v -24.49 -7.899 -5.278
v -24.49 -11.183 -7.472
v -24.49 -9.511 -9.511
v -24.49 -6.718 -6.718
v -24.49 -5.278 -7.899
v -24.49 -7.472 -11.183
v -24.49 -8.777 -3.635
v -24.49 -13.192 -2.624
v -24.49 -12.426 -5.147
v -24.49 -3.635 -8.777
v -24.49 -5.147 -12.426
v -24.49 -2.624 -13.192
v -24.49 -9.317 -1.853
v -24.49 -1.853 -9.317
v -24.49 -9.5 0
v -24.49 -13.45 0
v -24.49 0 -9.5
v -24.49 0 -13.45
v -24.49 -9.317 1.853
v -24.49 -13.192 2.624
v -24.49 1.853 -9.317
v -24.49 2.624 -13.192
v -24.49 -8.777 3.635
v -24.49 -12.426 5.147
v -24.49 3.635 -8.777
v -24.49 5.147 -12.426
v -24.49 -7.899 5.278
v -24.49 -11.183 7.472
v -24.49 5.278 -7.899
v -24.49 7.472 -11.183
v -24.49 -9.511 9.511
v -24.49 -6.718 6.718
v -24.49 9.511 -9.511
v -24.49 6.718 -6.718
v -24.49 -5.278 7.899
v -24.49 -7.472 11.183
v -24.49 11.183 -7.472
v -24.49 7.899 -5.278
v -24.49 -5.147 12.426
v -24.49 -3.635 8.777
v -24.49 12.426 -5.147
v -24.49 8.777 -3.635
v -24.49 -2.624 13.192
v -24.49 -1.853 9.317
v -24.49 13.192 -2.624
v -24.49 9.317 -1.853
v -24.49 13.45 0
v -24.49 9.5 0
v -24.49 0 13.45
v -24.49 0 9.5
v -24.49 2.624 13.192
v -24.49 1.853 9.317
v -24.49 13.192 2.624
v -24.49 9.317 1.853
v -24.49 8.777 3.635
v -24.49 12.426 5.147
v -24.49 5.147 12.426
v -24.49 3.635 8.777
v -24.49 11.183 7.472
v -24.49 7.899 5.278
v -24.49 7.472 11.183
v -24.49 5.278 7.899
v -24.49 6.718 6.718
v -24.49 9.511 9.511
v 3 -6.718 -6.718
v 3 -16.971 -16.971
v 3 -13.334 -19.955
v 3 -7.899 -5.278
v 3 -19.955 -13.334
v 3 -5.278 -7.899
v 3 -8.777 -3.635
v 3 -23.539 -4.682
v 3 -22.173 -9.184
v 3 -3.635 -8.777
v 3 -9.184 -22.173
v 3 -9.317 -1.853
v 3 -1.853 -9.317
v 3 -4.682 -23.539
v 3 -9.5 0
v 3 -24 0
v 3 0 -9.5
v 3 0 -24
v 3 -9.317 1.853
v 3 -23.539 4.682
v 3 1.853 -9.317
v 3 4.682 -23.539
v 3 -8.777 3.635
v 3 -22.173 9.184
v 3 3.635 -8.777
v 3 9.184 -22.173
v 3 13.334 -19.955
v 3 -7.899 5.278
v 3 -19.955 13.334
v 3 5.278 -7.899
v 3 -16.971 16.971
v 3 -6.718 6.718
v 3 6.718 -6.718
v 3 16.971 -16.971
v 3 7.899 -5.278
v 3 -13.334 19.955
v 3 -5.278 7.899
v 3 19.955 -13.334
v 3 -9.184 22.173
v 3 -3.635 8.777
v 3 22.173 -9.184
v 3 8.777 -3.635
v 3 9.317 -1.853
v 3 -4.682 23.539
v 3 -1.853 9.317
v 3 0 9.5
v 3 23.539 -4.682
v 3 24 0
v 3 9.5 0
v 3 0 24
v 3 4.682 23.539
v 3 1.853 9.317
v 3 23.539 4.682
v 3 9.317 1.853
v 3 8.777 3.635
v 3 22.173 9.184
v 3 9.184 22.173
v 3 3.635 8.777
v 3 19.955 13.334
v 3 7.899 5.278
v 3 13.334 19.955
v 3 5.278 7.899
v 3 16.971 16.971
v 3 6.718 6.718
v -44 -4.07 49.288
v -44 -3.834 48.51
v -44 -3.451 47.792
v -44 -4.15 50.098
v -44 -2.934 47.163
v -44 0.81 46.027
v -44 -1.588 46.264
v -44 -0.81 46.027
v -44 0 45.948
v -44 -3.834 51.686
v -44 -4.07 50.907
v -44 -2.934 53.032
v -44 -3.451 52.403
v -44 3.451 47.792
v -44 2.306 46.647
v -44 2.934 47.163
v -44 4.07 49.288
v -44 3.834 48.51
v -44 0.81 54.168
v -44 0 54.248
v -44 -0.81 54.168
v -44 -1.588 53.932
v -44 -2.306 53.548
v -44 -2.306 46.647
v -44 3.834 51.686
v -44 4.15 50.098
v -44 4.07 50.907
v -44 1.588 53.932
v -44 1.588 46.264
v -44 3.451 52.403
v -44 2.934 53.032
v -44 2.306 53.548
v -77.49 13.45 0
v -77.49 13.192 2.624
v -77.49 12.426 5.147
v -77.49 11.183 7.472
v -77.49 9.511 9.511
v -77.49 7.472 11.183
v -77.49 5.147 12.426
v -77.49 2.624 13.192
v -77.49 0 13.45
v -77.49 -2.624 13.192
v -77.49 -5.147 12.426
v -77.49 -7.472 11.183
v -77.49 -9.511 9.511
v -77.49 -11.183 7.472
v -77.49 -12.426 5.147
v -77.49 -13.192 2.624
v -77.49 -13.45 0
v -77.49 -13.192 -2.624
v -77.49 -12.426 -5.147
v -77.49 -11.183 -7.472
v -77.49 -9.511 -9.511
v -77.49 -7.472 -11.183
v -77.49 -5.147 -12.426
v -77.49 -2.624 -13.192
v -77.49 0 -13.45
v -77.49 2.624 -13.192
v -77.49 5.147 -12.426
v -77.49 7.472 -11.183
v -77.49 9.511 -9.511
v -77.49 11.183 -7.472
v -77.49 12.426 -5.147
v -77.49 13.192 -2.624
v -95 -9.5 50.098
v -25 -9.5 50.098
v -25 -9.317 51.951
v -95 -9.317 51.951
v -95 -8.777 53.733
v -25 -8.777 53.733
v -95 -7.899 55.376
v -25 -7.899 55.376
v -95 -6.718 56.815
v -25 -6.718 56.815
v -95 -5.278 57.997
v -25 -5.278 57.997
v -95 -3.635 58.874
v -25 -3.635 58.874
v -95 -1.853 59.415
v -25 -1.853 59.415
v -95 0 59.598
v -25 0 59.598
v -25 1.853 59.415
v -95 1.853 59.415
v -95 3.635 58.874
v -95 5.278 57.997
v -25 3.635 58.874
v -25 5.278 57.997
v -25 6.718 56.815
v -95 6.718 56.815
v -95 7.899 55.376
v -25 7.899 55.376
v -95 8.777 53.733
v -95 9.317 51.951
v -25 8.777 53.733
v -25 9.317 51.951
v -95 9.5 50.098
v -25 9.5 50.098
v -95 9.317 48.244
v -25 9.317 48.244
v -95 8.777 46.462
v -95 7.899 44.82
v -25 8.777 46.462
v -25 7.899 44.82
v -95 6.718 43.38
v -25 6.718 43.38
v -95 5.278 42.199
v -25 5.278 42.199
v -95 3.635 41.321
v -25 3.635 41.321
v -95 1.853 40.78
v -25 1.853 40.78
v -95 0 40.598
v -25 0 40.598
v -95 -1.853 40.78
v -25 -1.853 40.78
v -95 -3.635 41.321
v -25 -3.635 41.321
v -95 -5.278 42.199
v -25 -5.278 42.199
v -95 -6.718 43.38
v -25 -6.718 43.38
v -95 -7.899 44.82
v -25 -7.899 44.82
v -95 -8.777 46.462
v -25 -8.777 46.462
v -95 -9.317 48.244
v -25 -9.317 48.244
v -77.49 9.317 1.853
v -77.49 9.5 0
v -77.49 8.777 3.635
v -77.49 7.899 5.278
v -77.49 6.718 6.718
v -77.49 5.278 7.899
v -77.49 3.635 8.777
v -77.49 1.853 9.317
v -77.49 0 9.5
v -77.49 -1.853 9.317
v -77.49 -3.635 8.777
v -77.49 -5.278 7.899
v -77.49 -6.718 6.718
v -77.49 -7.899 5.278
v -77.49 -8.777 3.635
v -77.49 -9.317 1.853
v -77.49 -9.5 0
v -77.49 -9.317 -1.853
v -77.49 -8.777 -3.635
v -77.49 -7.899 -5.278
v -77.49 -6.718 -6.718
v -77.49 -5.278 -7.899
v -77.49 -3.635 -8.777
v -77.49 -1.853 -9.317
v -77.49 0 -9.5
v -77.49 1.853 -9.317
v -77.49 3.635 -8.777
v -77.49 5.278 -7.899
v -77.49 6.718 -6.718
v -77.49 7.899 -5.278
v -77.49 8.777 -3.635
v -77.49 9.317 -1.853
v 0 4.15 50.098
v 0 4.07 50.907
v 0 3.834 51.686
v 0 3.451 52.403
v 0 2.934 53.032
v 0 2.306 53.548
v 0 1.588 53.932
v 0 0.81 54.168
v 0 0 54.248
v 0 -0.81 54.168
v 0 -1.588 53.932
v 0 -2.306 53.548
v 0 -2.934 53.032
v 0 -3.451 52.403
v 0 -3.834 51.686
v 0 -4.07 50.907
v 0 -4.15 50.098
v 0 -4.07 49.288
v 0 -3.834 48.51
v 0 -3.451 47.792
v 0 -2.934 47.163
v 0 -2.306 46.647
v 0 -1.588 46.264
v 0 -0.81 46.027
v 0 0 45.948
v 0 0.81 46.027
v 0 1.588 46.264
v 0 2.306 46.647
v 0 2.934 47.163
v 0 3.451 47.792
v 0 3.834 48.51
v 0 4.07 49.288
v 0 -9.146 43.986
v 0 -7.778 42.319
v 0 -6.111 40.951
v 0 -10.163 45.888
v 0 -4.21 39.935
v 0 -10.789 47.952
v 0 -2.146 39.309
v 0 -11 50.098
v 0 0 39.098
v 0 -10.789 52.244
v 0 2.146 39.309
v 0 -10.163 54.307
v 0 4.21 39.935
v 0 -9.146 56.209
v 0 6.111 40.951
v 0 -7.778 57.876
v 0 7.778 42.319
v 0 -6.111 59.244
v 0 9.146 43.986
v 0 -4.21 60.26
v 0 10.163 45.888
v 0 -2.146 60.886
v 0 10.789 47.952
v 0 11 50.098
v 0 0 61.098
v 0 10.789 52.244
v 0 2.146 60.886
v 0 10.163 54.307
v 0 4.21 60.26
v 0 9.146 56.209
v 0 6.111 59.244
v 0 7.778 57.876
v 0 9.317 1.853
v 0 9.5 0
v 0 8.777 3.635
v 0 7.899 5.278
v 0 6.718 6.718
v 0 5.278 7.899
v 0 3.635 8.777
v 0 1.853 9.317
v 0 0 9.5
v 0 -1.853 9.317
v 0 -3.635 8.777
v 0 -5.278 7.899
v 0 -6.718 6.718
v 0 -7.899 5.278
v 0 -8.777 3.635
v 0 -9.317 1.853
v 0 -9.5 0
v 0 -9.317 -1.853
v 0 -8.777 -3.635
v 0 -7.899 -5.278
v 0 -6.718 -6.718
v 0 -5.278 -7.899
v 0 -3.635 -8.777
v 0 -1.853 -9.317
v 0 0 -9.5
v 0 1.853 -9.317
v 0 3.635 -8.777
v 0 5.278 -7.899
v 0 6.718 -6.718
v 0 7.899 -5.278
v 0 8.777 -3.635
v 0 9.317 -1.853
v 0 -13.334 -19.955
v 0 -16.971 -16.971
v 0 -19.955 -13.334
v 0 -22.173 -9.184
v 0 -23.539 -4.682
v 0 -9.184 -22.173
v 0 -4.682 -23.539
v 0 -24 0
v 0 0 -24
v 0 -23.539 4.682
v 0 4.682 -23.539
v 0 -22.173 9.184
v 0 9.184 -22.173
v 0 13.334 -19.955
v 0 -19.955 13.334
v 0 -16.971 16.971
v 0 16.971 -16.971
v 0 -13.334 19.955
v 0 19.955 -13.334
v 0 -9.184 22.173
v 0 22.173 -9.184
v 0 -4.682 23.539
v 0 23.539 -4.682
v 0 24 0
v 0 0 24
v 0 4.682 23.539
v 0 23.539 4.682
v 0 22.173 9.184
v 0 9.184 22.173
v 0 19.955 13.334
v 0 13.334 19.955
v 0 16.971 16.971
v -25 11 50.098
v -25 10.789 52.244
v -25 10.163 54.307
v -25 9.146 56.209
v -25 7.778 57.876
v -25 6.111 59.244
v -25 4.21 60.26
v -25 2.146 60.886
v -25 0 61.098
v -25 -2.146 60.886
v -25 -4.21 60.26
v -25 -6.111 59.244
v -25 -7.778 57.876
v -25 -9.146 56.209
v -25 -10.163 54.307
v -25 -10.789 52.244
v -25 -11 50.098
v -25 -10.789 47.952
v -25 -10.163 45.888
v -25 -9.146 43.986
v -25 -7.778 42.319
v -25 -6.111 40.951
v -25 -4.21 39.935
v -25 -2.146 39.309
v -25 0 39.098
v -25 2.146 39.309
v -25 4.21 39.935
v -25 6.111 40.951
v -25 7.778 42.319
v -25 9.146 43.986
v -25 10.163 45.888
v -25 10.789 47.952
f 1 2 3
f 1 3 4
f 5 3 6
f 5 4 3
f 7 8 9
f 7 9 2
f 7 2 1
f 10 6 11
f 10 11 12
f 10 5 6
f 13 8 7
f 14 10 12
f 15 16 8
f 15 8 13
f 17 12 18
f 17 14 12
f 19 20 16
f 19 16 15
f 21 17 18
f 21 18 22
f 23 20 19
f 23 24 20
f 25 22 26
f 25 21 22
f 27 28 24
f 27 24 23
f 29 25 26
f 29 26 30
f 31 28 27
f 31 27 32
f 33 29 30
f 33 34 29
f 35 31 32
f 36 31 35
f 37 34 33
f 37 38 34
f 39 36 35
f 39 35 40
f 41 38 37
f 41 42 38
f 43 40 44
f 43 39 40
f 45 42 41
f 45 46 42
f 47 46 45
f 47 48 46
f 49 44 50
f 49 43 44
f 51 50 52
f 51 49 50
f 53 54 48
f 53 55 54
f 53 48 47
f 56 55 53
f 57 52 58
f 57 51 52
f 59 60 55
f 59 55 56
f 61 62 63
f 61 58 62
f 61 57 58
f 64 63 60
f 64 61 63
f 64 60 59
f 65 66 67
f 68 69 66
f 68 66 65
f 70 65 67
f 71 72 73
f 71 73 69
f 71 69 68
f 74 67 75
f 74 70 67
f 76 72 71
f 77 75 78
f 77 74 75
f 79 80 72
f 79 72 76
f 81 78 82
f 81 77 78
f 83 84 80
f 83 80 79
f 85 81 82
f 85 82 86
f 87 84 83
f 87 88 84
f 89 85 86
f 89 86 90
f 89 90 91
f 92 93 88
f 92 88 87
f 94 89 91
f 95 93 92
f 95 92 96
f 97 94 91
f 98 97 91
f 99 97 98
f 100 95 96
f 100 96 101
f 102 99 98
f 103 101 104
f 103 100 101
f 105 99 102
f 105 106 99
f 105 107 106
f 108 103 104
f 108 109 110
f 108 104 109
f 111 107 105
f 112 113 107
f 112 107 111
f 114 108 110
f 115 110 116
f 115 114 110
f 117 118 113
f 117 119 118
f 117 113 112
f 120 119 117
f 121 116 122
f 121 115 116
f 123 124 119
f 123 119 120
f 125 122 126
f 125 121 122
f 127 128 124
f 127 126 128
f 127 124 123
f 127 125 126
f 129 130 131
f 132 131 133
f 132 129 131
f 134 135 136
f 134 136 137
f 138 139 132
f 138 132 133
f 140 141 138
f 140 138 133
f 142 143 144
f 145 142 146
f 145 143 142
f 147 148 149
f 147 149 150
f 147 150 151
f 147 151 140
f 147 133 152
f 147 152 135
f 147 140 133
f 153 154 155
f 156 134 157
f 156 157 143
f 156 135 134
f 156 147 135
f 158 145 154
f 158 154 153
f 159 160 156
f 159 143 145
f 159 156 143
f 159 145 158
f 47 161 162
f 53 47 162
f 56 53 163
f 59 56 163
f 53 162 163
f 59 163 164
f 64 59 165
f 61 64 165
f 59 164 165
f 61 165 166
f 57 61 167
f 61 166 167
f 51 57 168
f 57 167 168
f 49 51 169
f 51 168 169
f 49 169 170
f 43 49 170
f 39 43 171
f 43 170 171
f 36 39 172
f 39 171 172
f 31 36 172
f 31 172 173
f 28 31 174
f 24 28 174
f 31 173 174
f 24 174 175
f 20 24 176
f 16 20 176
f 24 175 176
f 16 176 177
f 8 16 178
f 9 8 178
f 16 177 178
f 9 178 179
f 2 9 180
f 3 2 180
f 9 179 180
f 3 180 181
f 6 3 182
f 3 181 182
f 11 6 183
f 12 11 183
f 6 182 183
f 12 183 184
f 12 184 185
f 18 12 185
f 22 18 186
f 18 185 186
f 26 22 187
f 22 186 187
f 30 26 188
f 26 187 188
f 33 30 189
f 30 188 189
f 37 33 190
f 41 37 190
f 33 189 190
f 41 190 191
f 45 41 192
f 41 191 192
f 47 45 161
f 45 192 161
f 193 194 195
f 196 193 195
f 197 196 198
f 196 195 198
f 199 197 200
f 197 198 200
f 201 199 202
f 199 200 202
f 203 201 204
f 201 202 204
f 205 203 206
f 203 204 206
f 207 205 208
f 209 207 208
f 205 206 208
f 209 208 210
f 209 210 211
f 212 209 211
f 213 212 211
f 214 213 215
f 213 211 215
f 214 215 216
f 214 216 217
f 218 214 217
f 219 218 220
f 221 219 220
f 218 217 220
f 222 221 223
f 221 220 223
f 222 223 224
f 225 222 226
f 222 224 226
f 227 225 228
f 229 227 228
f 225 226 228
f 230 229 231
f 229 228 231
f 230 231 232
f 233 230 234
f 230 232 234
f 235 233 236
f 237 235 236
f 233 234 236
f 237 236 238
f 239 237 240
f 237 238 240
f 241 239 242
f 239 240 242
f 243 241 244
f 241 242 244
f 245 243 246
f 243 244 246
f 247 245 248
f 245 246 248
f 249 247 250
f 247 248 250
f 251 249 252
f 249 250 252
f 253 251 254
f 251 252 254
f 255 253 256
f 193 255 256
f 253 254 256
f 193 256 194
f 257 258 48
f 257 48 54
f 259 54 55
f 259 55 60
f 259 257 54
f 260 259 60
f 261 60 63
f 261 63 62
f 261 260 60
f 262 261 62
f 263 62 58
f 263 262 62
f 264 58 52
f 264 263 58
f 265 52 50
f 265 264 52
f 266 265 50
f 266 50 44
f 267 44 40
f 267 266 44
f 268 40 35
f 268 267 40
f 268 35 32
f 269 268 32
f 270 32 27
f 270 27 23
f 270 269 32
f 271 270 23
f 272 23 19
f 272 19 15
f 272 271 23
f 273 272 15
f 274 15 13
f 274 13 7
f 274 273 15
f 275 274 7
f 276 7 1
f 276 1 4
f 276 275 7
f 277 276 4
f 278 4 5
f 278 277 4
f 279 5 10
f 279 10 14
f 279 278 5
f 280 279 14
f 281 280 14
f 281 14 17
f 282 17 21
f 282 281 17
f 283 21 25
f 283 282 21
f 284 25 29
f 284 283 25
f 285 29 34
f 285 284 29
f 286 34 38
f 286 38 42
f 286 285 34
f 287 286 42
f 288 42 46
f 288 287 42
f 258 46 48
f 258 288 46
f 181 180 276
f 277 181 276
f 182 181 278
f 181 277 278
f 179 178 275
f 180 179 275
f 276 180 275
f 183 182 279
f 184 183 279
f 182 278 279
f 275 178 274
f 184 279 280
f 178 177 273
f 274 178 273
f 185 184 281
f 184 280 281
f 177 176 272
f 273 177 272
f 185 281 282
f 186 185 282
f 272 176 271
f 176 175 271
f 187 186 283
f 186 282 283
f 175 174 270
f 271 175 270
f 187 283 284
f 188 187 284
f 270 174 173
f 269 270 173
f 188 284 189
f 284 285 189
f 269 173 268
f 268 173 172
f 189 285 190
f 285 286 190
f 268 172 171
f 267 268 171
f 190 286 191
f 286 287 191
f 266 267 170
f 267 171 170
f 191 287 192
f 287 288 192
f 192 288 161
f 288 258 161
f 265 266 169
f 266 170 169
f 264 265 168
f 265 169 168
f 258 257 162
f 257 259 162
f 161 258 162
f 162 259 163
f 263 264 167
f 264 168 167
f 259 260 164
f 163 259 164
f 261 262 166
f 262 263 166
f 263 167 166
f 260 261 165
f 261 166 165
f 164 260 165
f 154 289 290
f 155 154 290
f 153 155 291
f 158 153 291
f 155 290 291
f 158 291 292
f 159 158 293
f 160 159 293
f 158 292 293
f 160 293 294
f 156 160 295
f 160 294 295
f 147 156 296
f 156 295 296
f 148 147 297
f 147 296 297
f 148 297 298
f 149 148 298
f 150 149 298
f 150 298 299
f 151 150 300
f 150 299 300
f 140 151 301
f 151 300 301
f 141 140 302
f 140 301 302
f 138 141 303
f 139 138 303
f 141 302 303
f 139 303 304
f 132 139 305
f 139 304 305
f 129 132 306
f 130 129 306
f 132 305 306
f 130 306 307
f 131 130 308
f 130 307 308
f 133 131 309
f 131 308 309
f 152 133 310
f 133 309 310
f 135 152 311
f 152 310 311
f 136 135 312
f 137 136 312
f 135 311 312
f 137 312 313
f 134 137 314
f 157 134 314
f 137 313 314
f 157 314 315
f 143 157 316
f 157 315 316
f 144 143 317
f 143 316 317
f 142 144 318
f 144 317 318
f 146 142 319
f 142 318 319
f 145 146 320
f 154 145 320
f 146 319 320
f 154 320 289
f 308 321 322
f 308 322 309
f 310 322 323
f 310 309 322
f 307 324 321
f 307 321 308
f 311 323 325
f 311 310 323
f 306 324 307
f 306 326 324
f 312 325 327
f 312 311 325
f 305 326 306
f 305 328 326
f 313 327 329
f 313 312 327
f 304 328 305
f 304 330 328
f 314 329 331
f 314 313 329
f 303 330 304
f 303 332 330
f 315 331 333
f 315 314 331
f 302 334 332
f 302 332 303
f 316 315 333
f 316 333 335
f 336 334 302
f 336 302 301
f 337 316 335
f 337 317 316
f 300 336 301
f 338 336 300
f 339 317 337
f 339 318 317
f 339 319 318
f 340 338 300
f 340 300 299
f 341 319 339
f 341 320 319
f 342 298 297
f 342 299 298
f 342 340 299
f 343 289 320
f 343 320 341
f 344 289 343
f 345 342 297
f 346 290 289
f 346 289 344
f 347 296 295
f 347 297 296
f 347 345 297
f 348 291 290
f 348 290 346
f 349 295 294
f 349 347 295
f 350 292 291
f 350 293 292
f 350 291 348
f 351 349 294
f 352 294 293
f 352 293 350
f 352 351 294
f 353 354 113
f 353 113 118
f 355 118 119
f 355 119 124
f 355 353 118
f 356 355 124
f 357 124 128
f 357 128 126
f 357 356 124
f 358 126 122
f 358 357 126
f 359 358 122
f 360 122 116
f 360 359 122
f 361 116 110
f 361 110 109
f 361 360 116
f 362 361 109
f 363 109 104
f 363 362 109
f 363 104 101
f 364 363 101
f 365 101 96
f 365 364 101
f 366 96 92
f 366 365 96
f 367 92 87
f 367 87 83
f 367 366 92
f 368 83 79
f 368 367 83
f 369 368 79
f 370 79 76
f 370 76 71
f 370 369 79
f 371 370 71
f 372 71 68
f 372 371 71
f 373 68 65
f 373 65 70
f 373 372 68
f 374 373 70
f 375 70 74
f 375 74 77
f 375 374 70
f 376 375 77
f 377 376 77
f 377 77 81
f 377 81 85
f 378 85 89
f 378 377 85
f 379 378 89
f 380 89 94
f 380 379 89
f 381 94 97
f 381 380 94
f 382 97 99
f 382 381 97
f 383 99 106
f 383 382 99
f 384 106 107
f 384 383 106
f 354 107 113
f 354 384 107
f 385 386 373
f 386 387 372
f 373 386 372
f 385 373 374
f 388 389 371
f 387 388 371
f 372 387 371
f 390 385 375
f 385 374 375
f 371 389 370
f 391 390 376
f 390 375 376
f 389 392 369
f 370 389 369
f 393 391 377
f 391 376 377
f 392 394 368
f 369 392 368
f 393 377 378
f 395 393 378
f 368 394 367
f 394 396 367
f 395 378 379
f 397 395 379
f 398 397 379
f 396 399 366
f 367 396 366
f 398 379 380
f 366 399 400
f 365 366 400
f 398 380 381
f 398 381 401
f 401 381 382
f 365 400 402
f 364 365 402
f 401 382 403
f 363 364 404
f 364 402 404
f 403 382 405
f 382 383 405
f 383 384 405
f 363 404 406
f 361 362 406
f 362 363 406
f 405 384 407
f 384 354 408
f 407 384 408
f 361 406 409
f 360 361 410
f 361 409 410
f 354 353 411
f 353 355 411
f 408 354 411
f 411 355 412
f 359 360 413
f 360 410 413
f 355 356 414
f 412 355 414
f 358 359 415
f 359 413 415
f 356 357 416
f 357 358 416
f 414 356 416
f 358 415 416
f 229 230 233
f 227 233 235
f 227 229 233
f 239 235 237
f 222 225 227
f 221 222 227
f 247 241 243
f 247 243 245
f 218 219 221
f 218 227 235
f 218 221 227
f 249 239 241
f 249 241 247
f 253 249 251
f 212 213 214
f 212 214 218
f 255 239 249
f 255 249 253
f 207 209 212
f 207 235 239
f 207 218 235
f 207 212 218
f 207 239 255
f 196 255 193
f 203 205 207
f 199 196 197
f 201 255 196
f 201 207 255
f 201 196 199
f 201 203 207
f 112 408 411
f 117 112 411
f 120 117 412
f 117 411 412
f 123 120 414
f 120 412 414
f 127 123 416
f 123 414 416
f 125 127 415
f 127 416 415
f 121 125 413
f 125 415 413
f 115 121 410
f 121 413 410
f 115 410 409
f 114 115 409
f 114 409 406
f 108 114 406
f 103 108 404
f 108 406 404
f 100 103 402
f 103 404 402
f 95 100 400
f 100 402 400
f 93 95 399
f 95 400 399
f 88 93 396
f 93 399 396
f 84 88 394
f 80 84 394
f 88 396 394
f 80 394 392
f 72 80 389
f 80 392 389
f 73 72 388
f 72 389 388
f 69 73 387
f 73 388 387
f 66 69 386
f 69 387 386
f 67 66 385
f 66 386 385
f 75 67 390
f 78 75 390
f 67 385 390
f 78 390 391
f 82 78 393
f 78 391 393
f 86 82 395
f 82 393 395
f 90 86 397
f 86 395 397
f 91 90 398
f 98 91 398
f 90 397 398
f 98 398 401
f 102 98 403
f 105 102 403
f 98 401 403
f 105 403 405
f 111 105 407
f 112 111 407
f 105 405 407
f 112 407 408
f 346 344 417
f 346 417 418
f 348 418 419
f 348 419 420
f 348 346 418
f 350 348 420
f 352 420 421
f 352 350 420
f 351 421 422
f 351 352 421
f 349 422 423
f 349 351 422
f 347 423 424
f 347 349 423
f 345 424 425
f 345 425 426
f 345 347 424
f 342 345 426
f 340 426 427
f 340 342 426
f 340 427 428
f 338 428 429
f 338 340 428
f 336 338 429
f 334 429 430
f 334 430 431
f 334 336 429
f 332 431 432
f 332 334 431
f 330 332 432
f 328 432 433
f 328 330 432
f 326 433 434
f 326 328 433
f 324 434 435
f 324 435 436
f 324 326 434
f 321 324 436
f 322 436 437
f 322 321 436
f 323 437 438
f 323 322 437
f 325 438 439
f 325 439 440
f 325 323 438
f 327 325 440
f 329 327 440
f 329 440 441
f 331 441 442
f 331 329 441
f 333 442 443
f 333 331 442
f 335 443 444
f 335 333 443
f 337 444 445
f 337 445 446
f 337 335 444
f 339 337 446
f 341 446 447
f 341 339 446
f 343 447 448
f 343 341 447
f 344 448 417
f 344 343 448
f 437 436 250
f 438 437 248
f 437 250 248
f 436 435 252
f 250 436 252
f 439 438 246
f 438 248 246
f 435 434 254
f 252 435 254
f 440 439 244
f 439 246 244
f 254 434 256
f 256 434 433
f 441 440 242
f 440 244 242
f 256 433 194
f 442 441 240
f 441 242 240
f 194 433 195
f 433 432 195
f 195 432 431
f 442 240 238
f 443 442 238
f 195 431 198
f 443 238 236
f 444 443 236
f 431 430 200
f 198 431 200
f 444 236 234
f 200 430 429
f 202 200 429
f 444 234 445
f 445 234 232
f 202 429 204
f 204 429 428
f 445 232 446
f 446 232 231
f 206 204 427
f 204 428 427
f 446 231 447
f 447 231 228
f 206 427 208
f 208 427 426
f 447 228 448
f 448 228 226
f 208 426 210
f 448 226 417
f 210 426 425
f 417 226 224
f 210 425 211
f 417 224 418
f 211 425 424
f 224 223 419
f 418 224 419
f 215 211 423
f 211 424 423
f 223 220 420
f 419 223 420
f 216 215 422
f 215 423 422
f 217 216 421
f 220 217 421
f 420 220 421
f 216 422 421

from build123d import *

# Parameters (mm, degrees)
F0_R      = 24
F0_R_2    = 9.5
F1_DEPTH  = 3
F4_R      = 13.45
F4_R_2    = 9.5
F5_DEPTH  = 53
F6_R      = 11
F7_DEPTH  = 25
F8_R      = 9.5
F9_DEPTH  = 70
F10_R     = 4.15
F11_DEPTH = 44


with BuildPart() as f1:
    # F0 (on Right) → F1 (new body)
    with BuildSketch(Plane.YZ):
        Circle(F0_R)
        Circle(F0_R_2, mode=Mode.SUBTRACT)
    extrude(amount=F1_DEPTH)


with BuildPart() as f5:
    # F4 (on plane+point) → F5 (new body)
    with BuildSketch(Plane.YZ.offset(-77.490002)):
        Circle(F4_R)
        Circle(F4_R_2, mode=Mode.SUBTRACT)
    extrude(amount=F5_DEPTH)


with BuildPart() as f7:
    # F6 (on Right) → F7 (new body)
    with BuildSketch(Plane.YZ):
        with Locations((0, 50.097644)):
            Circle(F6_R)
    extrude(amount=-F7_DEPTH)

    # F8 (on face) → F9 (join)
    with BuildSketch(Plane(origin=(-25, 0, 0), x_dir=(0, -1, 0), z_dir=(-1, 0, 0))):
        with Locations((0, 50.097644)):
            Circle(F8_R)
    extrude(amount=F9_DEPTH)

    # F10 (on face) → F11 (cut)
    with BuildSketch(Plane.YZ):
        with Locations((0, 50.097644)):
            Circle(F10_R)
    extrude(amount=-F11_DEPTH, mode=Mode.SUBTRACT)


solid = Compound([f1.part, f5.part, f7.part])
